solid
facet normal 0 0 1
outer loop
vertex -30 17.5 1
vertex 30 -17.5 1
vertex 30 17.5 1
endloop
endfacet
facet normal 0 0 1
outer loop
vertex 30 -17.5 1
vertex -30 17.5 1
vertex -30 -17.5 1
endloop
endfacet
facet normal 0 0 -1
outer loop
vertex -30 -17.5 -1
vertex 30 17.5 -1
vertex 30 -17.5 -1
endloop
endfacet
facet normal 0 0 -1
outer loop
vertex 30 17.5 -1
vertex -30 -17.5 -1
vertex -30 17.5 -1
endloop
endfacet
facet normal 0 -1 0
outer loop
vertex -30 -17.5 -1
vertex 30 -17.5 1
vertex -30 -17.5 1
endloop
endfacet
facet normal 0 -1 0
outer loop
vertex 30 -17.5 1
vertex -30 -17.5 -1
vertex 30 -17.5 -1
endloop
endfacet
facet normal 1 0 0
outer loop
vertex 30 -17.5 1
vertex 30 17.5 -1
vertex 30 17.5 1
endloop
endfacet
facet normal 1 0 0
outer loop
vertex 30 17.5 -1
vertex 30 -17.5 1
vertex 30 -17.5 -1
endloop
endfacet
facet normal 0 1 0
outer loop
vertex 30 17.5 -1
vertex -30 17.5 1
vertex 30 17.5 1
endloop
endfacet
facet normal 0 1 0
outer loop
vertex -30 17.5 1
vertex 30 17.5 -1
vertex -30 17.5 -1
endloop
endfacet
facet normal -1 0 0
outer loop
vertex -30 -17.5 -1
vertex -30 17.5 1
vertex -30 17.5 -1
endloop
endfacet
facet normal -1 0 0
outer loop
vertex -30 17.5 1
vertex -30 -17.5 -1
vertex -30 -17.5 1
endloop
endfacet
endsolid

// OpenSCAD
// ========================================
// a plate 60 mm wide 35 mm deep and 2 mm thick
// NeuroCAD canonical IR; dimensions are millimetres
// ========================================
$fn = 48;

cube(size=[60, 35, 2], center=true);
